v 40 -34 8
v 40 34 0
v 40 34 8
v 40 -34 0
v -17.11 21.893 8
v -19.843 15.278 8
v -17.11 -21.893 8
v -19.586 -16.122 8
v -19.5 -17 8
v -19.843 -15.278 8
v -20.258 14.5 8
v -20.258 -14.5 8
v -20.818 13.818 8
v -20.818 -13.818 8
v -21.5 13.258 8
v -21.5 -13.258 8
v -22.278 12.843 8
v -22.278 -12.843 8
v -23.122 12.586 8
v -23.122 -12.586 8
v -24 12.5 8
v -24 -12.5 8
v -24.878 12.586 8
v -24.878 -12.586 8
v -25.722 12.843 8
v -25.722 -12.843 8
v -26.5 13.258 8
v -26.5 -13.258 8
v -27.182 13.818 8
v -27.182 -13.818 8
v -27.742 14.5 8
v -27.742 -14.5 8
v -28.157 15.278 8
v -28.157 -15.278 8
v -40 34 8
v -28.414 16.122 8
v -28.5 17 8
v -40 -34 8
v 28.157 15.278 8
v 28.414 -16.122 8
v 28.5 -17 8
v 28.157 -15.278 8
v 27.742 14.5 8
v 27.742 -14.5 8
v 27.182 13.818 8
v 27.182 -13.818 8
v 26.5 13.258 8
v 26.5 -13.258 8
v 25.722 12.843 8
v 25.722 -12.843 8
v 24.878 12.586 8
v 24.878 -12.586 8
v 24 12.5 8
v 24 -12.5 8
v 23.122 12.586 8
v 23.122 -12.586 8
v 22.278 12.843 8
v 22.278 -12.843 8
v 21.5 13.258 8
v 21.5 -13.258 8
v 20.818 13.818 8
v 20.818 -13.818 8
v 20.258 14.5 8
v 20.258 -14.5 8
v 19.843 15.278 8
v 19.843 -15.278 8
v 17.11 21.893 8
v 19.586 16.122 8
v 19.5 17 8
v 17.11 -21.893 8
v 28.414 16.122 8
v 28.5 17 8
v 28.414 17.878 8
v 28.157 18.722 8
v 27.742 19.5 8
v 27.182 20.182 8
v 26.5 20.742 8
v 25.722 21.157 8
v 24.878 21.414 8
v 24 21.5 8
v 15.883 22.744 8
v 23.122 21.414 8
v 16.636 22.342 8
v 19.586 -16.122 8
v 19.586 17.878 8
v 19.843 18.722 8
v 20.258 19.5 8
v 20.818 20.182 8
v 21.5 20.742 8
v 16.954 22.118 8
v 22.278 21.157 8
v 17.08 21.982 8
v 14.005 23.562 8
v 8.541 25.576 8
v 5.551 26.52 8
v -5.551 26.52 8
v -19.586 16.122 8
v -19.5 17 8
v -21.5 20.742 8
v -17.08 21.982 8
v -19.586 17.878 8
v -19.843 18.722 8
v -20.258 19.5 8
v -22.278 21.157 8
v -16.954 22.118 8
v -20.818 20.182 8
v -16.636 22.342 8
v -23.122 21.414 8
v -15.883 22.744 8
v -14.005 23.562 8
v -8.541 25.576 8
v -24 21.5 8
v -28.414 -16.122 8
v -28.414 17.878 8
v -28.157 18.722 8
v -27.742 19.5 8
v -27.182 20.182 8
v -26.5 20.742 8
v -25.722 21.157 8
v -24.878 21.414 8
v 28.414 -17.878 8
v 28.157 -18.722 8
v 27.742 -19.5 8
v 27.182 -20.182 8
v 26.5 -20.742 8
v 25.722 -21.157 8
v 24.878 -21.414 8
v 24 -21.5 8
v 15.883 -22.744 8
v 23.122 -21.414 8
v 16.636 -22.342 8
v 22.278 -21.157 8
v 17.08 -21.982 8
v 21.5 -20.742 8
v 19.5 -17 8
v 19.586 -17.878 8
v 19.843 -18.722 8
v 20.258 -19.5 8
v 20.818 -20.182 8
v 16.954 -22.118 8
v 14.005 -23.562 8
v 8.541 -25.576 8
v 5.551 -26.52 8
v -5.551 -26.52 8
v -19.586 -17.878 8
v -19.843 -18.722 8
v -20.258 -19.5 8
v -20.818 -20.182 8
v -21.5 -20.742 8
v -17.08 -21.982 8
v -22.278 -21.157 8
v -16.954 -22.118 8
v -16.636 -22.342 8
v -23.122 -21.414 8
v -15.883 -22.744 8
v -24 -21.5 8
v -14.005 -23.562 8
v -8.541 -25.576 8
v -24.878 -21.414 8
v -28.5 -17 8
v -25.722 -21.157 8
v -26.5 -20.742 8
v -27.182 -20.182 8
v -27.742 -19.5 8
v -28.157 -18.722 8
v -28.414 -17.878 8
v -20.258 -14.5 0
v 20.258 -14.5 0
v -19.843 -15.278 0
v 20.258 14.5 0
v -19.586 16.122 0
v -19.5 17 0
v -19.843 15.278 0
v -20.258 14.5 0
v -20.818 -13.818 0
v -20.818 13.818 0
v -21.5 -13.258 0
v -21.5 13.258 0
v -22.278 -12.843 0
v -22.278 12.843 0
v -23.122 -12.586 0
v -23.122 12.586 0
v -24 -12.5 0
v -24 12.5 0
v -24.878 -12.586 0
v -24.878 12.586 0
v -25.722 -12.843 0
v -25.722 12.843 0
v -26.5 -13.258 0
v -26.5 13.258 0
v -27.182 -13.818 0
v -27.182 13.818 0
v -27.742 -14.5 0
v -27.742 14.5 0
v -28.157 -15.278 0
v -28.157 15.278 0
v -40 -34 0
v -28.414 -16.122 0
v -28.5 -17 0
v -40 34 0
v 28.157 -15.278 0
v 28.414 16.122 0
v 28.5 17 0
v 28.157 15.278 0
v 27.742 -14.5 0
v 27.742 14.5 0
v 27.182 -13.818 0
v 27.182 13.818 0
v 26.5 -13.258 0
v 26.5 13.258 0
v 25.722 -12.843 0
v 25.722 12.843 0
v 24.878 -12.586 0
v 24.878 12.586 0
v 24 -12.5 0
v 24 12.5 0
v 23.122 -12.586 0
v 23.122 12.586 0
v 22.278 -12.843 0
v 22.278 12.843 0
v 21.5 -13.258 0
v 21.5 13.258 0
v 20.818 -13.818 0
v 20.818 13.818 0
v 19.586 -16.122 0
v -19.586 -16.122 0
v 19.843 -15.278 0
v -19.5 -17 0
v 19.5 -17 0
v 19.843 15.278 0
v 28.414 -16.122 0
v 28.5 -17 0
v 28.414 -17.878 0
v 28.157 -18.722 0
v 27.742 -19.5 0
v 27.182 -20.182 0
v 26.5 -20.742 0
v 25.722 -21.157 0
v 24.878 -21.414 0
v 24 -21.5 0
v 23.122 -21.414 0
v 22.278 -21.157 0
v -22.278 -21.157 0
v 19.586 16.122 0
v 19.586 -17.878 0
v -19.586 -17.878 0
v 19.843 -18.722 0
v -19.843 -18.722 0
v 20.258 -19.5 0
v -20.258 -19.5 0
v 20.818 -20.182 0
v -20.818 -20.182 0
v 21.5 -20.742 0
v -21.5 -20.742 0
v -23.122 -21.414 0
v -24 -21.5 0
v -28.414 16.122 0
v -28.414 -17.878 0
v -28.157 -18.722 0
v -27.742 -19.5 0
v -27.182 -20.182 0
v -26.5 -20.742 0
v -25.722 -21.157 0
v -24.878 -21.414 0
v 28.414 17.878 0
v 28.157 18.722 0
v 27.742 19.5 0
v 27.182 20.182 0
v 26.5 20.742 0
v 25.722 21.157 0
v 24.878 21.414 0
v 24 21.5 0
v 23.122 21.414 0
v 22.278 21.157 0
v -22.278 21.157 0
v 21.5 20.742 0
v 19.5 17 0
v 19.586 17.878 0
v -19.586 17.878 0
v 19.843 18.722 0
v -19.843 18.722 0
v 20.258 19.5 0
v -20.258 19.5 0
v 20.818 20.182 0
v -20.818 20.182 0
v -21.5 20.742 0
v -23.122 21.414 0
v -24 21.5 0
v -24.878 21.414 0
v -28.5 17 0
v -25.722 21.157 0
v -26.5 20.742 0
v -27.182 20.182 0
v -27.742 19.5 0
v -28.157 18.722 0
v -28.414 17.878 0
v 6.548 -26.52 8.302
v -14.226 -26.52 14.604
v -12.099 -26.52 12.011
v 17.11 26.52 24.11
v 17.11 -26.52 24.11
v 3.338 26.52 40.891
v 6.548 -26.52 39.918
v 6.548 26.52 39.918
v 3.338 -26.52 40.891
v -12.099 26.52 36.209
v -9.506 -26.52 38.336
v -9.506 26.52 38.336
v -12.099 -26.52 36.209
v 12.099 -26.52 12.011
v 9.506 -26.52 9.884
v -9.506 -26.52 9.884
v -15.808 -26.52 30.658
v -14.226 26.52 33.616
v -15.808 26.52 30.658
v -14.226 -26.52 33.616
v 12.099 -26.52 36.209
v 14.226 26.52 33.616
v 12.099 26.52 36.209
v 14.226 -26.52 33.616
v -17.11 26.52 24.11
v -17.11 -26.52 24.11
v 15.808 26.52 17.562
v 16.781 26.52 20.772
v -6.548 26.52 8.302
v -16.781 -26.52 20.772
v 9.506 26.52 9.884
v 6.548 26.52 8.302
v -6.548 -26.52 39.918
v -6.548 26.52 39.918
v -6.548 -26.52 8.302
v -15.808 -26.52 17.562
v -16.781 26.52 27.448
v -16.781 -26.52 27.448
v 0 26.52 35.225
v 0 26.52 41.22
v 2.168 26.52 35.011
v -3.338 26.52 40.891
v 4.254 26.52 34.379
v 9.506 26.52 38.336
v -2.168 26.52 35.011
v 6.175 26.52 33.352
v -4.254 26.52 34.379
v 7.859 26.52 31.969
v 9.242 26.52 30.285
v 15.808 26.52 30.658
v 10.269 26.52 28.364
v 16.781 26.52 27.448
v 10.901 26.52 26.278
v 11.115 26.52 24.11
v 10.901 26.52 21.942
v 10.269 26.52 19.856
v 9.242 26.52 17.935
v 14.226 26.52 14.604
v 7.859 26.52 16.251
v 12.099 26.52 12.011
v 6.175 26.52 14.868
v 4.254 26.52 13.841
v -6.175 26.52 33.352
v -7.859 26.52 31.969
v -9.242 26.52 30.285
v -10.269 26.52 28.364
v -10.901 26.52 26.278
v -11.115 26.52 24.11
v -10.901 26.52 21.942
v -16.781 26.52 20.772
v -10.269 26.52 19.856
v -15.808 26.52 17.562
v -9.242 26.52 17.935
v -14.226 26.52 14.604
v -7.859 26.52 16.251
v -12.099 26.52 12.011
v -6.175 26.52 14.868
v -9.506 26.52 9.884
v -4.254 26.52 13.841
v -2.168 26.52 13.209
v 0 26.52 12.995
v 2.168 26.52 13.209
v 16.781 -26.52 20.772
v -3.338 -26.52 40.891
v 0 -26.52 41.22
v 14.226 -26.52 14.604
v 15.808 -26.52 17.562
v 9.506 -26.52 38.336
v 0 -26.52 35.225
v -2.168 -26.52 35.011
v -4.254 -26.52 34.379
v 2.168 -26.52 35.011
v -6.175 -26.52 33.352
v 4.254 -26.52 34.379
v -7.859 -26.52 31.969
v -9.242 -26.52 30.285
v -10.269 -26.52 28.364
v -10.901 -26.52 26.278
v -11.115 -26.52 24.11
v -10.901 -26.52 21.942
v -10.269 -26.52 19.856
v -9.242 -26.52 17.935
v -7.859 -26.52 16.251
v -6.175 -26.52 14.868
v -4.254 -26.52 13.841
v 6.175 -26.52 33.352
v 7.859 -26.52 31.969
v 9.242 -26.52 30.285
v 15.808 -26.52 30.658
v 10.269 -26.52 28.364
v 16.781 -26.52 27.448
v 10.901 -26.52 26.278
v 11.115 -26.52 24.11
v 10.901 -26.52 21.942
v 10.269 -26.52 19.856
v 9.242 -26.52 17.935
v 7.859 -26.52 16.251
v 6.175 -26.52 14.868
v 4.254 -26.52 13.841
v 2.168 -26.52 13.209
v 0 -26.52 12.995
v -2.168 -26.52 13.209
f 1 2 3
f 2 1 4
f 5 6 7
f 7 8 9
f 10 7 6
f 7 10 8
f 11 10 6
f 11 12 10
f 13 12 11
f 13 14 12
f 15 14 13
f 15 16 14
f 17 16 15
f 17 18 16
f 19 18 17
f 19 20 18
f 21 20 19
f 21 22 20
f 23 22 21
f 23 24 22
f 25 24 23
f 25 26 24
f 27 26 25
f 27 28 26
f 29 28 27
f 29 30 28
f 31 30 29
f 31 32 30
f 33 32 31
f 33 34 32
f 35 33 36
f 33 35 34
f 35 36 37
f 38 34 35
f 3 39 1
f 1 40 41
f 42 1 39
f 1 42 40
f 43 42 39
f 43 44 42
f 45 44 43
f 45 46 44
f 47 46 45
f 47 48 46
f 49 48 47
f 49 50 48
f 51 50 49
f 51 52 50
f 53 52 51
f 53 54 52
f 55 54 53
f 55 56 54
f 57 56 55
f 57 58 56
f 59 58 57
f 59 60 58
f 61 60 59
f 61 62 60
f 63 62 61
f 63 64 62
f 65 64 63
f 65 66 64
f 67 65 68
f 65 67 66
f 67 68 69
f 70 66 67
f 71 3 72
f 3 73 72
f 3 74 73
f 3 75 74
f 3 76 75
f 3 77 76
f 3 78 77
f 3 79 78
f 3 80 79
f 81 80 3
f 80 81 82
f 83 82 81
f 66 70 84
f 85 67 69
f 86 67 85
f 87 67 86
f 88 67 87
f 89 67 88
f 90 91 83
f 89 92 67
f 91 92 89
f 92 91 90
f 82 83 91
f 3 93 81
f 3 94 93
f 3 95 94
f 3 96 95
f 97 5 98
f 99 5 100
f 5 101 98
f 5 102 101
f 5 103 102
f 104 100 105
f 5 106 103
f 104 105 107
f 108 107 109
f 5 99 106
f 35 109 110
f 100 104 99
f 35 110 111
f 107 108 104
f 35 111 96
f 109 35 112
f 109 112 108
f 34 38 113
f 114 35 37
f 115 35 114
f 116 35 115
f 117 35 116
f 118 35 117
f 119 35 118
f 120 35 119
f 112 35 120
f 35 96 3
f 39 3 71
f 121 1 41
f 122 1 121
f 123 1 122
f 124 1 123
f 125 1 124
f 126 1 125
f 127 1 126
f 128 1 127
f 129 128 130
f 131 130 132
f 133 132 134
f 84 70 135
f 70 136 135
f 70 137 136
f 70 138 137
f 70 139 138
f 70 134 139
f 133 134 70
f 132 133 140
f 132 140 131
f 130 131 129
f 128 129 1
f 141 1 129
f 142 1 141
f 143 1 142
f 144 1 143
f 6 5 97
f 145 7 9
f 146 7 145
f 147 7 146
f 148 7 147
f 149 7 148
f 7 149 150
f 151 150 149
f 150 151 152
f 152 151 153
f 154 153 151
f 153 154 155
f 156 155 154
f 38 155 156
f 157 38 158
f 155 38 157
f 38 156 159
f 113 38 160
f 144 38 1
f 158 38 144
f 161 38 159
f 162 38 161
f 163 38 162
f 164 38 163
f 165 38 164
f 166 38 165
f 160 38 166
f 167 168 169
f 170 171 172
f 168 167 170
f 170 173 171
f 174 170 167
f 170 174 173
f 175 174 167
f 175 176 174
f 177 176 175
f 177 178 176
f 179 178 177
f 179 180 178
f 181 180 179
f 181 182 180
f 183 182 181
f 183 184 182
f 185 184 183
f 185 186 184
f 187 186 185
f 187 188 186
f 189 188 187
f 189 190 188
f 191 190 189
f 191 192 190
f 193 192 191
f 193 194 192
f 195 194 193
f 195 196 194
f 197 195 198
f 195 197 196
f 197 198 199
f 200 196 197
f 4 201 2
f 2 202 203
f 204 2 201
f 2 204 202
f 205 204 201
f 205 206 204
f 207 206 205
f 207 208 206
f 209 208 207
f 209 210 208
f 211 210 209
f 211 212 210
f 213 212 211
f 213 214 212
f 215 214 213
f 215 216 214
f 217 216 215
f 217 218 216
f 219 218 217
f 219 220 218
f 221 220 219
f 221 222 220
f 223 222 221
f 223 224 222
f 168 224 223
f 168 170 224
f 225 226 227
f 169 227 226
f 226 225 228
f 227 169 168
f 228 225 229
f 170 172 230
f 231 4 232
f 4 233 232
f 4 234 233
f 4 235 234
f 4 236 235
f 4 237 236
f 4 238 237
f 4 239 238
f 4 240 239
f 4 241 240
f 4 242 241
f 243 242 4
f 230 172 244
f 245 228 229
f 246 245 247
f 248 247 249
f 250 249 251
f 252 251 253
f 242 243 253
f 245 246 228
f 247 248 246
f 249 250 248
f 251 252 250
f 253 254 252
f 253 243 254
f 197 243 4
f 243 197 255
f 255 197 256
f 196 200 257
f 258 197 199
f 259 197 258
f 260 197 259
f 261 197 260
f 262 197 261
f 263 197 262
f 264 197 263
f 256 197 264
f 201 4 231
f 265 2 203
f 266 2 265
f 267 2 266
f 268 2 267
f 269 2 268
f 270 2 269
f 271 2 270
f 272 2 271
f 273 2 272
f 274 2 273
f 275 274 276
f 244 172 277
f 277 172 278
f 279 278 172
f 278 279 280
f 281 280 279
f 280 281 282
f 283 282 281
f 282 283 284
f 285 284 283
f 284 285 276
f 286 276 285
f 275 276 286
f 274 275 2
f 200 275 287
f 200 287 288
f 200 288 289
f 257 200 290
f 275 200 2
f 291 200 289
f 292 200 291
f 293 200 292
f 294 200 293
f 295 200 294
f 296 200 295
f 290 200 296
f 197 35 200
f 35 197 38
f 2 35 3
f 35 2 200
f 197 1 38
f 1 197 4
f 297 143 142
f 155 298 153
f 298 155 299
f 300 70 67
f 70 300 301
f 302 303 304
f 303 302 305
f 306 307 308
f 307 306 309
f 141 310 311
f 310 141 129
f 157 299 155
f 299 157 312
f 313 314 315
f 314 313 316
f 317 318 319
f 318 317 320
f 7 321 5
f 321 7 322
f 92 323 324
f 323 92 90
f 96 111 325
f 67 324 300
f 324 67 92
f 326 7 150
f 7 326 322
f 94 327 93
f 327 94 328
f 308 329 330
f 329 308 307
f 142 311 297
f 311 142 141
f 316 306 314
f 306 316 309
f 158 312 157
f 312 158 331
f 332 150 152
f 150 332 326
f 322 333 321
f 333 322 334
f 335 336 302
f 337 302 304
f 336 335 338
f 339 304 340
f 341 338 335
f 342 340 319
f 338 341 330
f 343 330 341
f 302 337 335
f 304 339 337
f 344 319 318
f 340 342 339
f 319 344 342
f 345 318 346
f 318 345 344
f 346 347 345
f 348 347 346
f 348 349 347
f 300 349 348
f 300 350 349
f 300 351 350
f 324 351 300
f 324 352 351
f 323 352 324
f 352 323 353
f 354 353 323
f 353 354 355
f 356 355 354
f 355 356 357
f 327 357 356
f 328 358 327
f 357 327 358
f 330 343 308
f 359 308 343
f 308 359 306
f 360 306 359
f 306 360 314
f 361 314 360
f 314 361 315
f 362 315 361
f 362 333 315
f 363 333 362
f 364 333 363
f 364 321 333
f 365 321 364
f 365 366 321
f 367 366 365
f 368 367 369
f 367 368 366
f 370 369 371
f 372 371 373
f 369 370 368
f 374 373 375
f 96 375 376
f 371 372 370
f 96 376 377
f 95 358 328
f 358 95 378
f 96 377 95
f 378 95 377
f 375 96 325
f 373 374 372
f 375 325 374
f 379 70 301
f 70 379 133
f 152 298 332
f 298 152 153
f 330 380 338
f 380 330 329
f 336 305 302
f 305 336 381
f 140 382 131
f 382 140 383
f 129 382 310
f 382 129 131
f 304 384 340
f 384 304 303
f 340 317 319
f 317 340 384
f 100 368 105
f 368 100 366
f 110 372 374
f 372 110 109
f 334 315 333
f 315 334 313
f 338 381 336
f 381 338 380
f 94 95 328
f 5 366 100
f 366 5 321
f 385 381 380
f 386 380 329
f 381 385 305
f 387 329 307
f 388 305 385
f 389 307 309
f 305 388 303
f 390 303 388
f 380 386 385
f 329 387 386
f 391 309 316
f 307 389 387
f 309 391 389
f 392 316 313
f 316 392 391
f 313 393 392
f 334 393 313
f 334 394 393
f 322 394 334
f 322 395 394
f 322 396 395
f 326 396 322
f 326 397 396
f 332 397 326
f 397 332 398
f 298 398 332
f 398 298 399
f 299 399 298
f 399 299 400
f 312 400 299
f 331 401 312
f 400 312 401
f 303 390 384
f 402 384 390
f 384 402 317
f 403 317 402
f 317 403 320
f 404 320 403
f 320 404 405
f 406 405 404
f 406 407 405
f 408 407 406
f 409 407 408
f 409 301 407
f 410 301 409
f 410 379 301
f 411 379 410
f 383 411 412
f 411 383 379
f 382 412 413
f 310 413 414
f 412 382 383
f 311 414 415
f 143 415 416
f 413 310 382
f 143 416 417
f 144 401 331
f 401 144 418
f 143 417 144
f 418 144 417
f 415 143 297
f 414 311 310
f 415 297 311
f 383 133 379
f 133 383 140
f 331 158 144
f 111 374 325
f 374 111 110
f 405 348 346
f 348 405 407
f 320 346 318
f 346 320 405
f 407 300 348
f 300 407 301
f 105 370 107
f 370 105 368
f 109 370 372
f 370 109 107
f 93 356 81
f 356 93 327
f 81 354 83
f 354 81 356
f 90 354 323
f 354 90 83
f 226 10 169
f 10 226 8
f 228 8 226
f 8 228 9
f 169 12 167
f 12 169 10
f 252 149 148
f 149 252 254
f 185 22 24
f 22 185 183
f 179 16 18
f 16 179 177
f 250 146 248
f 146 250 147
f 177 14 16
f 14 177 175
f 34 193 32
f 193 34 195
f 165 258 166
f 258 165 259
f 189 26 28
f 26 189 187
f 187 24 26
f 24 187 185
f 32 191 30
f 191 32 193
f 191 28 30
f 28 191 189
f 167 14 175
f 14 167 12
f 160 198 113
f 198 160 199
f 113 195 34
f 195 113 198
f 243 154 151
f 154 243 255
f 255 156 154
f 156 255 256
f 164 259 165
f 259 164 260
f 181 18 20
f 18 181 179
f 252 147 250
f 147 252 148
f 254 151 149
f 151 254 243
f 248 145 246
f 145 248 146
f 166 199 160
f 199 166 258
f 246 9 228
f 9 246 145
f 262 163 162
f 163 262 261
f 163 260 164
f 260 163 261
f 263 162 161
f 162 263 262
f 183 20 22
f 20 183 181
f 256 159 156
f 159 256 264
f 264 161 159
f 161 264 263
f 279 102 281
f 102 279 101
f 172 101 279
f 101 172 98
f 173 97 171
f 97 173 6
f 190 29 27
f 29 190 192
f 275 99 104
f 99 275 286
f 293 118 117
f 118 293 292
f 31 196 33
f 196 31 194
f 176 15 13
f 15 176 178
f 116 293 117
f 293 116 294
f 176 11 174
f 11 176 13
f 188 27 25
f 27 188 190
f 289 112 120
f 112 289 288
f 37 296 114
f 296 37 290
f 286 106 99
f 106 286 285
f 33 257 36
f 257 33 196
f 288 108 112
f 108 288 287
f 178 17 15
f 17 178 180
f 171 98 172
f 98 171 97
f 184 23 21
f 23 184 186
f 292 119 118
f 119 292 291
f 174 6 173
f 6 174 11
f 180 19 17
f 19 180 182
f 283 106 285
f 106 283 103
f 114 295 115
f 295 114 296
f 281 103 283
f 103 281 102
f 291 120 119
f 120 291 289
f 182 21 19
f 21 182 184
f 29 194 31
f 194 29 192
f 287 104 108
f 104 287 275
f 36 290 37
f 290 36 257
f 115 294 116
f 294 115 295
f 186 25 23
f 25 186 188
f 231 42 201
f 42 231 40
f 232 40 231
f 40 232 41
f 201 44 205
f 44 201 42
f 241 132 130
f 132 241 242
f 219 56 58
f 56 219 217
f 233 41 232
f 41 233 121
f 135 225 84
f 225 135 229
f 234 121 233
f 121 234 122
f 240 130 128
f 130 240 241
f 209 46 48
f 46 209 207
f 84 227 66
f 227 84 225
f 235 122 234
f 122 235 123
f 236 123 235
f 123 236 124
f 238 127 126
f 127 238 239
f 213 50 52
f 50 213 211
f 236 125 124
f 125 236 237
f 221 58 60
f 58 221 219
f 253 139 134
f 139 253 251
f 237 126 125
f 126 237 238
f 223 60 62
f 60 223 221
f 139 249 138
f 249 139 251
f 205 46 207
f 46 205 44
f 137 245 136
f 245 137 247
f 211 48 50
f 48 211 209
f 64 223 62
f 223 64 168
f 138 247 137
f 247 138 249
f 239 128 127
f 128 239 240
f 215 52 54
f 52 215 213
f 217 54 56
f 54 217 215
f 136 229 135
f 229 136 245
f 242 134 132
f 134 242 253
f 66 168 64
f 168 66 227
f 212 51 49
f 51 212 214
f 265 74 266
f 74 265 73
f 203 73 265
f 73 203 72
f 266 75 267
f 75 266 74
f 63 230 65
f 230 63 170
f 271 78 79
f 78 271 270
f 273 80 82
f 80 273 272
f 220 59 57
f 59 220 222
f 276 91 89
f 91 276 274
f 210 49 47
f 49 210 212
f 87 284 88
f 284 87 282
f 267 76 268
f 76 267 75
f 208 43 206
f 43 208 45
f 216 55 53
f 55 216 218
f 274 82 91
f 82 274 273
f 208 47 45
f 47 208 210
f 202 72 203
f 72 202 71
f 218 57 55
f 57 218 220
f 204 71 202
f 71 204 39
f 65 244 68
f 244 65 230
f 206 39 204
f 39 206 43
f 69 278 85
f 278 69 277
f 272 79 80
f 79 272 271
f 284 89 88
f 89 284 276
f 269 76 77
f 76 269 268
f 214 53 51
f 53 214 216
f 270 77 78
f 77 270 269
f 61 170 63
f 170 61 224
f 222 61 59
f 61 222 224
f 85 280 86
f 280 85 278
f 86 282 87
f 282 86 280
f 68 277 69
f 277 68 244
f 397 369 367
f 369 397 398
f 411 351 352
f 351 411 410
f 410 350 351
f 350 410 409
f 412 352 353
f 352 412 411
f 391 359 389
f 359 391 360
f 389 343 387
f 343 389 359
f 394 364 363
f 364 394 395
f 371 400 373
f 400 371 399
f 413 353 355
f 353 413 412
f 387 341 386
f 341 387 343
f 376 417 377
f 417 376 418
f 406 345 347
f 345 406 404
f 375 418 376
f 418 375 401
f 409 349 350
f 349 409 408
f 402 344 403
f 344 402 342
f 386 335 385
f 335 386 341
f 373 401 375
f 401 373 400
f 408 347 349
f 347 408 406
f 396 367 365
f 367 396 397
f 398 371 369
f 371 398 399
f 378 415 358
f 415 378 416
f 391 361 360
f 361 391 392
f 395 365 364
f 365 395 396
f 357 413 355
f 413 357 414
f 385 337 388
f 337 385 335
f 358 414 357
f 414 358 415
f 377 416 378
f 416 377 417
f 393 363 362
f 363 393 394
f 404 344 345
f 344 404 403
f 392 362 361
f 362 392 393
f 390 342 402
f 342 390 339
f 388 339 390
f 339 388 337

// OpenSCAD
$fn = 32;

// ----------------------------------------------------------------------
// Bearing block: 80 x 68 mm base, 22.23 mm bore at 24.11 mm
// ----------------------------------------------------------------------

// --- parameters (mm) ---
base_w = 80;              // base width
base_d = 68;              // base depth
base_t = 8;               // base thickness
bore_d = 22.23;           // shaft / bearing bore
house_r = 17.11;          // housing outer radius
house_len = 53.04;        // housing length along the shaft
foot_w = 34.22;           // foot width under the housing
foot_len = 43.04;         // foot length along the shaft
axis_z = 24.11;           // bore axis height above the base
holes_d = 9;              // mounting holes
hole_x = 24;              // mounting hole spacing

difference() {
  union() {
    /* base plate with its underside on z = 0 */
    translate([0, 0, base_t / 2]) cube([base_w, base_d, base_t], center = true);
    /* hull foot: a straight web blending into the round housing */
    hull() {
      translate([0, 0, base_t - 0.5]) cube([foot_w, foot_len, 1.6], center = true);
      translate([0, 0, axis_z]) rotate([-90, 0, 0]) cylinder(h = house_len, d = 2 * house_r, center = true);
    }
  }
  /* bore through the housing, 2.5 mm clear on both sides */
  translate([0, 0, axis_z]) rotate([-90, 0, 0]) cylinder(h = house_len + 5, d = bore_d, center = true);
  /* mounting holes through the base plate */
  for (hx = [-24, 24]) {
    for (hy = [-17, 17]) {
      translate([hx, hy, -2.5]) cylinder(h = base_t + 5, d = holes_d);
    }
  }
}
